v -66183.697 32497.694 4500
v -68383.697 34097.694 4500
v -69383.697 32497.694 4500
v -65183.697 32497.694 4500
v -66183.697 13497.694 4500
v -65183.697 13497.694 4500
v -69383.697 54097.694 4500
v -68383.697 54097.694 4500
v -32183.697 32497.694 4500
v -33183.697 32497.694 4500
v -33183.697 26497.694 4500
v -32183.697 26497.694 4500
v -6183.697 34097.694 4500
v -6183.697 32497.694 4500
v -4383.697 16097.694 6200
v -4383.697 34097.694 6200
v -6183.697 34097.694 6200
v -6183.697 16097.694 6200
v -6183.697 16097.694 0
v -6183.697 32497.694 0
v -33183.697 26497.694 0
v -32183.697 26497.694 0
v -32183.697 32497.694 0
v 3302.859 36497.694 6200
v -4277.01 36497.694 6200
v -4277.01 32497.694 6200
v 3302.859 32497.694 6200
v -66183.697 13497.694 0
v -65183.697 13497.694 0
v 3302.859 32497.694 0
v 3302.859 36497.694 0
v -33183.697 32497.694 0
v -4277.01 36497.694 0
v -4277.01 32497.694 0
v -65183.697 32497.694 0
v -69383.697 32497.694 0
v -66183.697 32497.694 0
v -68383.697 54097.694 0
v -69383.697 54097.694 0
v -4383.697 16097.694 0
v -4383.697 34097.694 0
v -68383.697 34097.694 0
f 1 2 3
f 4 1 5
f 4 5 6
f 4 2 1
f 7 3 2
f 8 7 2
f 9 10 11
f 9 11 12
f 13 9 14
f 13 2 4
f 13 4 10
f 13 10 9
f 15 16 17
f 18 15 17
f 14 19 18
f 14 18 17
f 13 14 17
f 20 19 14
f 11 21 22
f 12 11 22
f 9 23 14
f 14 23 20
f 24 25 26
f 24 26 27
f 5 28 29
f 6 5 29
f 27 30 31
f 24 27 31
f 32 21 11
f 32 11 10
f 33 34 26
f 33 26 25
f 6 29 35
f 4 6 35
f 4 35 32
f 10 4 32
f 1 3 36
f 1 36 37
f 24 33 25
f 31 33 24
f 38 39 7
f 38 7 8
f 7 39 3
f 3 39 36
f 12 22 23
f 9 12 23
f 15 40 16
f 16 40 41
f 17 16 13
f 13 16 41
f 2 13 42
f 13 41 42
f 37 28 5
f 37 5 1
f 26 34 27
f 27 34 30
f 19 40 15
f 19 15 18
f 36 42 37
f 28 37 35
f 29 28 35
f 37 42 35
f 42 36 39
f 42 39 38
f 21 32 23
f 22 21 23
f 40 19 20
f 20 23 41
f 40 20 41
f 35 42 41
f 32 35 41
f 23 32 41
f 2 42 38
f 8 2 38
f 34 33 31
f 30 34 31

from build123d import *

# Parameters (mm, degrees)
SKETCH1_W      = 7579.868665923
SKETCH1_H      = 4000
EXTRUDE1_DEPTH = 6200
SKETCH2_W      = 1800
SKETCH2_H      = 18000
EXTRUDE2_DEPTH = 6200
SKETCH3_W      = 1000
SKETCH3_H      = 20000
SKETCH3_H_2    = 6000
SKETCH3_H_3    = 19000
EXTRUDE3_DEPTH = 4500


with BuildPart() as part:
    # Sketch1 → Extrude1 (new body)
    with BuildSketch(Plane.XY):
        with Locations((-487.075667039, 34497.694415458)):
            Rectangle(SKETCH1_W, SKETCH1_H)
    extrude(amount=EXTRUDE1_DEPTH)


with BuildPart() as body_2:
    # Sketch2 → Extrude2 (new body)
    with BuildSketch(Plane(origin=(0, 0, 0), x_dir=(-1, 0, 0), z_dir=(0, 0, -1))):
        with Locations((5283.69738863, 25097.694415458)):
            Rectangle(SKETCH2_W, SKETCH2_H)
    extrude(amount=-EXTRUDE2_DEPTH)

    # Sketch3 → Extrude3 (add)
    with BuildSketch(Plane.XY):
        Polygon((-6183.69738863, 32497.694415458), (-6183.69738863, 34097.694415458), (-68383.69738863, 34097.694415458), (-69383.69738863, 34097.694415458), (-69383.69738863, 32497.694415458), (-66183.69738863, 32497.694415458), (-65183.69738863, 32497.694415458), (-33183.69738863, 32497.694415458), (-32183.69738863, 32497.694415458), align=None)
        with Locations((-68883.69738863, 44097.694415458)):
            Rectangle(SKETCH3_W, SKETCH3_H)
        with Locations((-32683.69738863, 29497.694415458)):
            Rectangle(SKETCH3_W, SKETCH3_H_2)
        with Locations((-65683.69738863, 22997.694415458)):
            Rectangle(SKETCH3_W, SKETCH3_H_3)
    extrude(amount=EXTRUDE3_DEPTH)


solid = Compound([part.part, body_2.part])
